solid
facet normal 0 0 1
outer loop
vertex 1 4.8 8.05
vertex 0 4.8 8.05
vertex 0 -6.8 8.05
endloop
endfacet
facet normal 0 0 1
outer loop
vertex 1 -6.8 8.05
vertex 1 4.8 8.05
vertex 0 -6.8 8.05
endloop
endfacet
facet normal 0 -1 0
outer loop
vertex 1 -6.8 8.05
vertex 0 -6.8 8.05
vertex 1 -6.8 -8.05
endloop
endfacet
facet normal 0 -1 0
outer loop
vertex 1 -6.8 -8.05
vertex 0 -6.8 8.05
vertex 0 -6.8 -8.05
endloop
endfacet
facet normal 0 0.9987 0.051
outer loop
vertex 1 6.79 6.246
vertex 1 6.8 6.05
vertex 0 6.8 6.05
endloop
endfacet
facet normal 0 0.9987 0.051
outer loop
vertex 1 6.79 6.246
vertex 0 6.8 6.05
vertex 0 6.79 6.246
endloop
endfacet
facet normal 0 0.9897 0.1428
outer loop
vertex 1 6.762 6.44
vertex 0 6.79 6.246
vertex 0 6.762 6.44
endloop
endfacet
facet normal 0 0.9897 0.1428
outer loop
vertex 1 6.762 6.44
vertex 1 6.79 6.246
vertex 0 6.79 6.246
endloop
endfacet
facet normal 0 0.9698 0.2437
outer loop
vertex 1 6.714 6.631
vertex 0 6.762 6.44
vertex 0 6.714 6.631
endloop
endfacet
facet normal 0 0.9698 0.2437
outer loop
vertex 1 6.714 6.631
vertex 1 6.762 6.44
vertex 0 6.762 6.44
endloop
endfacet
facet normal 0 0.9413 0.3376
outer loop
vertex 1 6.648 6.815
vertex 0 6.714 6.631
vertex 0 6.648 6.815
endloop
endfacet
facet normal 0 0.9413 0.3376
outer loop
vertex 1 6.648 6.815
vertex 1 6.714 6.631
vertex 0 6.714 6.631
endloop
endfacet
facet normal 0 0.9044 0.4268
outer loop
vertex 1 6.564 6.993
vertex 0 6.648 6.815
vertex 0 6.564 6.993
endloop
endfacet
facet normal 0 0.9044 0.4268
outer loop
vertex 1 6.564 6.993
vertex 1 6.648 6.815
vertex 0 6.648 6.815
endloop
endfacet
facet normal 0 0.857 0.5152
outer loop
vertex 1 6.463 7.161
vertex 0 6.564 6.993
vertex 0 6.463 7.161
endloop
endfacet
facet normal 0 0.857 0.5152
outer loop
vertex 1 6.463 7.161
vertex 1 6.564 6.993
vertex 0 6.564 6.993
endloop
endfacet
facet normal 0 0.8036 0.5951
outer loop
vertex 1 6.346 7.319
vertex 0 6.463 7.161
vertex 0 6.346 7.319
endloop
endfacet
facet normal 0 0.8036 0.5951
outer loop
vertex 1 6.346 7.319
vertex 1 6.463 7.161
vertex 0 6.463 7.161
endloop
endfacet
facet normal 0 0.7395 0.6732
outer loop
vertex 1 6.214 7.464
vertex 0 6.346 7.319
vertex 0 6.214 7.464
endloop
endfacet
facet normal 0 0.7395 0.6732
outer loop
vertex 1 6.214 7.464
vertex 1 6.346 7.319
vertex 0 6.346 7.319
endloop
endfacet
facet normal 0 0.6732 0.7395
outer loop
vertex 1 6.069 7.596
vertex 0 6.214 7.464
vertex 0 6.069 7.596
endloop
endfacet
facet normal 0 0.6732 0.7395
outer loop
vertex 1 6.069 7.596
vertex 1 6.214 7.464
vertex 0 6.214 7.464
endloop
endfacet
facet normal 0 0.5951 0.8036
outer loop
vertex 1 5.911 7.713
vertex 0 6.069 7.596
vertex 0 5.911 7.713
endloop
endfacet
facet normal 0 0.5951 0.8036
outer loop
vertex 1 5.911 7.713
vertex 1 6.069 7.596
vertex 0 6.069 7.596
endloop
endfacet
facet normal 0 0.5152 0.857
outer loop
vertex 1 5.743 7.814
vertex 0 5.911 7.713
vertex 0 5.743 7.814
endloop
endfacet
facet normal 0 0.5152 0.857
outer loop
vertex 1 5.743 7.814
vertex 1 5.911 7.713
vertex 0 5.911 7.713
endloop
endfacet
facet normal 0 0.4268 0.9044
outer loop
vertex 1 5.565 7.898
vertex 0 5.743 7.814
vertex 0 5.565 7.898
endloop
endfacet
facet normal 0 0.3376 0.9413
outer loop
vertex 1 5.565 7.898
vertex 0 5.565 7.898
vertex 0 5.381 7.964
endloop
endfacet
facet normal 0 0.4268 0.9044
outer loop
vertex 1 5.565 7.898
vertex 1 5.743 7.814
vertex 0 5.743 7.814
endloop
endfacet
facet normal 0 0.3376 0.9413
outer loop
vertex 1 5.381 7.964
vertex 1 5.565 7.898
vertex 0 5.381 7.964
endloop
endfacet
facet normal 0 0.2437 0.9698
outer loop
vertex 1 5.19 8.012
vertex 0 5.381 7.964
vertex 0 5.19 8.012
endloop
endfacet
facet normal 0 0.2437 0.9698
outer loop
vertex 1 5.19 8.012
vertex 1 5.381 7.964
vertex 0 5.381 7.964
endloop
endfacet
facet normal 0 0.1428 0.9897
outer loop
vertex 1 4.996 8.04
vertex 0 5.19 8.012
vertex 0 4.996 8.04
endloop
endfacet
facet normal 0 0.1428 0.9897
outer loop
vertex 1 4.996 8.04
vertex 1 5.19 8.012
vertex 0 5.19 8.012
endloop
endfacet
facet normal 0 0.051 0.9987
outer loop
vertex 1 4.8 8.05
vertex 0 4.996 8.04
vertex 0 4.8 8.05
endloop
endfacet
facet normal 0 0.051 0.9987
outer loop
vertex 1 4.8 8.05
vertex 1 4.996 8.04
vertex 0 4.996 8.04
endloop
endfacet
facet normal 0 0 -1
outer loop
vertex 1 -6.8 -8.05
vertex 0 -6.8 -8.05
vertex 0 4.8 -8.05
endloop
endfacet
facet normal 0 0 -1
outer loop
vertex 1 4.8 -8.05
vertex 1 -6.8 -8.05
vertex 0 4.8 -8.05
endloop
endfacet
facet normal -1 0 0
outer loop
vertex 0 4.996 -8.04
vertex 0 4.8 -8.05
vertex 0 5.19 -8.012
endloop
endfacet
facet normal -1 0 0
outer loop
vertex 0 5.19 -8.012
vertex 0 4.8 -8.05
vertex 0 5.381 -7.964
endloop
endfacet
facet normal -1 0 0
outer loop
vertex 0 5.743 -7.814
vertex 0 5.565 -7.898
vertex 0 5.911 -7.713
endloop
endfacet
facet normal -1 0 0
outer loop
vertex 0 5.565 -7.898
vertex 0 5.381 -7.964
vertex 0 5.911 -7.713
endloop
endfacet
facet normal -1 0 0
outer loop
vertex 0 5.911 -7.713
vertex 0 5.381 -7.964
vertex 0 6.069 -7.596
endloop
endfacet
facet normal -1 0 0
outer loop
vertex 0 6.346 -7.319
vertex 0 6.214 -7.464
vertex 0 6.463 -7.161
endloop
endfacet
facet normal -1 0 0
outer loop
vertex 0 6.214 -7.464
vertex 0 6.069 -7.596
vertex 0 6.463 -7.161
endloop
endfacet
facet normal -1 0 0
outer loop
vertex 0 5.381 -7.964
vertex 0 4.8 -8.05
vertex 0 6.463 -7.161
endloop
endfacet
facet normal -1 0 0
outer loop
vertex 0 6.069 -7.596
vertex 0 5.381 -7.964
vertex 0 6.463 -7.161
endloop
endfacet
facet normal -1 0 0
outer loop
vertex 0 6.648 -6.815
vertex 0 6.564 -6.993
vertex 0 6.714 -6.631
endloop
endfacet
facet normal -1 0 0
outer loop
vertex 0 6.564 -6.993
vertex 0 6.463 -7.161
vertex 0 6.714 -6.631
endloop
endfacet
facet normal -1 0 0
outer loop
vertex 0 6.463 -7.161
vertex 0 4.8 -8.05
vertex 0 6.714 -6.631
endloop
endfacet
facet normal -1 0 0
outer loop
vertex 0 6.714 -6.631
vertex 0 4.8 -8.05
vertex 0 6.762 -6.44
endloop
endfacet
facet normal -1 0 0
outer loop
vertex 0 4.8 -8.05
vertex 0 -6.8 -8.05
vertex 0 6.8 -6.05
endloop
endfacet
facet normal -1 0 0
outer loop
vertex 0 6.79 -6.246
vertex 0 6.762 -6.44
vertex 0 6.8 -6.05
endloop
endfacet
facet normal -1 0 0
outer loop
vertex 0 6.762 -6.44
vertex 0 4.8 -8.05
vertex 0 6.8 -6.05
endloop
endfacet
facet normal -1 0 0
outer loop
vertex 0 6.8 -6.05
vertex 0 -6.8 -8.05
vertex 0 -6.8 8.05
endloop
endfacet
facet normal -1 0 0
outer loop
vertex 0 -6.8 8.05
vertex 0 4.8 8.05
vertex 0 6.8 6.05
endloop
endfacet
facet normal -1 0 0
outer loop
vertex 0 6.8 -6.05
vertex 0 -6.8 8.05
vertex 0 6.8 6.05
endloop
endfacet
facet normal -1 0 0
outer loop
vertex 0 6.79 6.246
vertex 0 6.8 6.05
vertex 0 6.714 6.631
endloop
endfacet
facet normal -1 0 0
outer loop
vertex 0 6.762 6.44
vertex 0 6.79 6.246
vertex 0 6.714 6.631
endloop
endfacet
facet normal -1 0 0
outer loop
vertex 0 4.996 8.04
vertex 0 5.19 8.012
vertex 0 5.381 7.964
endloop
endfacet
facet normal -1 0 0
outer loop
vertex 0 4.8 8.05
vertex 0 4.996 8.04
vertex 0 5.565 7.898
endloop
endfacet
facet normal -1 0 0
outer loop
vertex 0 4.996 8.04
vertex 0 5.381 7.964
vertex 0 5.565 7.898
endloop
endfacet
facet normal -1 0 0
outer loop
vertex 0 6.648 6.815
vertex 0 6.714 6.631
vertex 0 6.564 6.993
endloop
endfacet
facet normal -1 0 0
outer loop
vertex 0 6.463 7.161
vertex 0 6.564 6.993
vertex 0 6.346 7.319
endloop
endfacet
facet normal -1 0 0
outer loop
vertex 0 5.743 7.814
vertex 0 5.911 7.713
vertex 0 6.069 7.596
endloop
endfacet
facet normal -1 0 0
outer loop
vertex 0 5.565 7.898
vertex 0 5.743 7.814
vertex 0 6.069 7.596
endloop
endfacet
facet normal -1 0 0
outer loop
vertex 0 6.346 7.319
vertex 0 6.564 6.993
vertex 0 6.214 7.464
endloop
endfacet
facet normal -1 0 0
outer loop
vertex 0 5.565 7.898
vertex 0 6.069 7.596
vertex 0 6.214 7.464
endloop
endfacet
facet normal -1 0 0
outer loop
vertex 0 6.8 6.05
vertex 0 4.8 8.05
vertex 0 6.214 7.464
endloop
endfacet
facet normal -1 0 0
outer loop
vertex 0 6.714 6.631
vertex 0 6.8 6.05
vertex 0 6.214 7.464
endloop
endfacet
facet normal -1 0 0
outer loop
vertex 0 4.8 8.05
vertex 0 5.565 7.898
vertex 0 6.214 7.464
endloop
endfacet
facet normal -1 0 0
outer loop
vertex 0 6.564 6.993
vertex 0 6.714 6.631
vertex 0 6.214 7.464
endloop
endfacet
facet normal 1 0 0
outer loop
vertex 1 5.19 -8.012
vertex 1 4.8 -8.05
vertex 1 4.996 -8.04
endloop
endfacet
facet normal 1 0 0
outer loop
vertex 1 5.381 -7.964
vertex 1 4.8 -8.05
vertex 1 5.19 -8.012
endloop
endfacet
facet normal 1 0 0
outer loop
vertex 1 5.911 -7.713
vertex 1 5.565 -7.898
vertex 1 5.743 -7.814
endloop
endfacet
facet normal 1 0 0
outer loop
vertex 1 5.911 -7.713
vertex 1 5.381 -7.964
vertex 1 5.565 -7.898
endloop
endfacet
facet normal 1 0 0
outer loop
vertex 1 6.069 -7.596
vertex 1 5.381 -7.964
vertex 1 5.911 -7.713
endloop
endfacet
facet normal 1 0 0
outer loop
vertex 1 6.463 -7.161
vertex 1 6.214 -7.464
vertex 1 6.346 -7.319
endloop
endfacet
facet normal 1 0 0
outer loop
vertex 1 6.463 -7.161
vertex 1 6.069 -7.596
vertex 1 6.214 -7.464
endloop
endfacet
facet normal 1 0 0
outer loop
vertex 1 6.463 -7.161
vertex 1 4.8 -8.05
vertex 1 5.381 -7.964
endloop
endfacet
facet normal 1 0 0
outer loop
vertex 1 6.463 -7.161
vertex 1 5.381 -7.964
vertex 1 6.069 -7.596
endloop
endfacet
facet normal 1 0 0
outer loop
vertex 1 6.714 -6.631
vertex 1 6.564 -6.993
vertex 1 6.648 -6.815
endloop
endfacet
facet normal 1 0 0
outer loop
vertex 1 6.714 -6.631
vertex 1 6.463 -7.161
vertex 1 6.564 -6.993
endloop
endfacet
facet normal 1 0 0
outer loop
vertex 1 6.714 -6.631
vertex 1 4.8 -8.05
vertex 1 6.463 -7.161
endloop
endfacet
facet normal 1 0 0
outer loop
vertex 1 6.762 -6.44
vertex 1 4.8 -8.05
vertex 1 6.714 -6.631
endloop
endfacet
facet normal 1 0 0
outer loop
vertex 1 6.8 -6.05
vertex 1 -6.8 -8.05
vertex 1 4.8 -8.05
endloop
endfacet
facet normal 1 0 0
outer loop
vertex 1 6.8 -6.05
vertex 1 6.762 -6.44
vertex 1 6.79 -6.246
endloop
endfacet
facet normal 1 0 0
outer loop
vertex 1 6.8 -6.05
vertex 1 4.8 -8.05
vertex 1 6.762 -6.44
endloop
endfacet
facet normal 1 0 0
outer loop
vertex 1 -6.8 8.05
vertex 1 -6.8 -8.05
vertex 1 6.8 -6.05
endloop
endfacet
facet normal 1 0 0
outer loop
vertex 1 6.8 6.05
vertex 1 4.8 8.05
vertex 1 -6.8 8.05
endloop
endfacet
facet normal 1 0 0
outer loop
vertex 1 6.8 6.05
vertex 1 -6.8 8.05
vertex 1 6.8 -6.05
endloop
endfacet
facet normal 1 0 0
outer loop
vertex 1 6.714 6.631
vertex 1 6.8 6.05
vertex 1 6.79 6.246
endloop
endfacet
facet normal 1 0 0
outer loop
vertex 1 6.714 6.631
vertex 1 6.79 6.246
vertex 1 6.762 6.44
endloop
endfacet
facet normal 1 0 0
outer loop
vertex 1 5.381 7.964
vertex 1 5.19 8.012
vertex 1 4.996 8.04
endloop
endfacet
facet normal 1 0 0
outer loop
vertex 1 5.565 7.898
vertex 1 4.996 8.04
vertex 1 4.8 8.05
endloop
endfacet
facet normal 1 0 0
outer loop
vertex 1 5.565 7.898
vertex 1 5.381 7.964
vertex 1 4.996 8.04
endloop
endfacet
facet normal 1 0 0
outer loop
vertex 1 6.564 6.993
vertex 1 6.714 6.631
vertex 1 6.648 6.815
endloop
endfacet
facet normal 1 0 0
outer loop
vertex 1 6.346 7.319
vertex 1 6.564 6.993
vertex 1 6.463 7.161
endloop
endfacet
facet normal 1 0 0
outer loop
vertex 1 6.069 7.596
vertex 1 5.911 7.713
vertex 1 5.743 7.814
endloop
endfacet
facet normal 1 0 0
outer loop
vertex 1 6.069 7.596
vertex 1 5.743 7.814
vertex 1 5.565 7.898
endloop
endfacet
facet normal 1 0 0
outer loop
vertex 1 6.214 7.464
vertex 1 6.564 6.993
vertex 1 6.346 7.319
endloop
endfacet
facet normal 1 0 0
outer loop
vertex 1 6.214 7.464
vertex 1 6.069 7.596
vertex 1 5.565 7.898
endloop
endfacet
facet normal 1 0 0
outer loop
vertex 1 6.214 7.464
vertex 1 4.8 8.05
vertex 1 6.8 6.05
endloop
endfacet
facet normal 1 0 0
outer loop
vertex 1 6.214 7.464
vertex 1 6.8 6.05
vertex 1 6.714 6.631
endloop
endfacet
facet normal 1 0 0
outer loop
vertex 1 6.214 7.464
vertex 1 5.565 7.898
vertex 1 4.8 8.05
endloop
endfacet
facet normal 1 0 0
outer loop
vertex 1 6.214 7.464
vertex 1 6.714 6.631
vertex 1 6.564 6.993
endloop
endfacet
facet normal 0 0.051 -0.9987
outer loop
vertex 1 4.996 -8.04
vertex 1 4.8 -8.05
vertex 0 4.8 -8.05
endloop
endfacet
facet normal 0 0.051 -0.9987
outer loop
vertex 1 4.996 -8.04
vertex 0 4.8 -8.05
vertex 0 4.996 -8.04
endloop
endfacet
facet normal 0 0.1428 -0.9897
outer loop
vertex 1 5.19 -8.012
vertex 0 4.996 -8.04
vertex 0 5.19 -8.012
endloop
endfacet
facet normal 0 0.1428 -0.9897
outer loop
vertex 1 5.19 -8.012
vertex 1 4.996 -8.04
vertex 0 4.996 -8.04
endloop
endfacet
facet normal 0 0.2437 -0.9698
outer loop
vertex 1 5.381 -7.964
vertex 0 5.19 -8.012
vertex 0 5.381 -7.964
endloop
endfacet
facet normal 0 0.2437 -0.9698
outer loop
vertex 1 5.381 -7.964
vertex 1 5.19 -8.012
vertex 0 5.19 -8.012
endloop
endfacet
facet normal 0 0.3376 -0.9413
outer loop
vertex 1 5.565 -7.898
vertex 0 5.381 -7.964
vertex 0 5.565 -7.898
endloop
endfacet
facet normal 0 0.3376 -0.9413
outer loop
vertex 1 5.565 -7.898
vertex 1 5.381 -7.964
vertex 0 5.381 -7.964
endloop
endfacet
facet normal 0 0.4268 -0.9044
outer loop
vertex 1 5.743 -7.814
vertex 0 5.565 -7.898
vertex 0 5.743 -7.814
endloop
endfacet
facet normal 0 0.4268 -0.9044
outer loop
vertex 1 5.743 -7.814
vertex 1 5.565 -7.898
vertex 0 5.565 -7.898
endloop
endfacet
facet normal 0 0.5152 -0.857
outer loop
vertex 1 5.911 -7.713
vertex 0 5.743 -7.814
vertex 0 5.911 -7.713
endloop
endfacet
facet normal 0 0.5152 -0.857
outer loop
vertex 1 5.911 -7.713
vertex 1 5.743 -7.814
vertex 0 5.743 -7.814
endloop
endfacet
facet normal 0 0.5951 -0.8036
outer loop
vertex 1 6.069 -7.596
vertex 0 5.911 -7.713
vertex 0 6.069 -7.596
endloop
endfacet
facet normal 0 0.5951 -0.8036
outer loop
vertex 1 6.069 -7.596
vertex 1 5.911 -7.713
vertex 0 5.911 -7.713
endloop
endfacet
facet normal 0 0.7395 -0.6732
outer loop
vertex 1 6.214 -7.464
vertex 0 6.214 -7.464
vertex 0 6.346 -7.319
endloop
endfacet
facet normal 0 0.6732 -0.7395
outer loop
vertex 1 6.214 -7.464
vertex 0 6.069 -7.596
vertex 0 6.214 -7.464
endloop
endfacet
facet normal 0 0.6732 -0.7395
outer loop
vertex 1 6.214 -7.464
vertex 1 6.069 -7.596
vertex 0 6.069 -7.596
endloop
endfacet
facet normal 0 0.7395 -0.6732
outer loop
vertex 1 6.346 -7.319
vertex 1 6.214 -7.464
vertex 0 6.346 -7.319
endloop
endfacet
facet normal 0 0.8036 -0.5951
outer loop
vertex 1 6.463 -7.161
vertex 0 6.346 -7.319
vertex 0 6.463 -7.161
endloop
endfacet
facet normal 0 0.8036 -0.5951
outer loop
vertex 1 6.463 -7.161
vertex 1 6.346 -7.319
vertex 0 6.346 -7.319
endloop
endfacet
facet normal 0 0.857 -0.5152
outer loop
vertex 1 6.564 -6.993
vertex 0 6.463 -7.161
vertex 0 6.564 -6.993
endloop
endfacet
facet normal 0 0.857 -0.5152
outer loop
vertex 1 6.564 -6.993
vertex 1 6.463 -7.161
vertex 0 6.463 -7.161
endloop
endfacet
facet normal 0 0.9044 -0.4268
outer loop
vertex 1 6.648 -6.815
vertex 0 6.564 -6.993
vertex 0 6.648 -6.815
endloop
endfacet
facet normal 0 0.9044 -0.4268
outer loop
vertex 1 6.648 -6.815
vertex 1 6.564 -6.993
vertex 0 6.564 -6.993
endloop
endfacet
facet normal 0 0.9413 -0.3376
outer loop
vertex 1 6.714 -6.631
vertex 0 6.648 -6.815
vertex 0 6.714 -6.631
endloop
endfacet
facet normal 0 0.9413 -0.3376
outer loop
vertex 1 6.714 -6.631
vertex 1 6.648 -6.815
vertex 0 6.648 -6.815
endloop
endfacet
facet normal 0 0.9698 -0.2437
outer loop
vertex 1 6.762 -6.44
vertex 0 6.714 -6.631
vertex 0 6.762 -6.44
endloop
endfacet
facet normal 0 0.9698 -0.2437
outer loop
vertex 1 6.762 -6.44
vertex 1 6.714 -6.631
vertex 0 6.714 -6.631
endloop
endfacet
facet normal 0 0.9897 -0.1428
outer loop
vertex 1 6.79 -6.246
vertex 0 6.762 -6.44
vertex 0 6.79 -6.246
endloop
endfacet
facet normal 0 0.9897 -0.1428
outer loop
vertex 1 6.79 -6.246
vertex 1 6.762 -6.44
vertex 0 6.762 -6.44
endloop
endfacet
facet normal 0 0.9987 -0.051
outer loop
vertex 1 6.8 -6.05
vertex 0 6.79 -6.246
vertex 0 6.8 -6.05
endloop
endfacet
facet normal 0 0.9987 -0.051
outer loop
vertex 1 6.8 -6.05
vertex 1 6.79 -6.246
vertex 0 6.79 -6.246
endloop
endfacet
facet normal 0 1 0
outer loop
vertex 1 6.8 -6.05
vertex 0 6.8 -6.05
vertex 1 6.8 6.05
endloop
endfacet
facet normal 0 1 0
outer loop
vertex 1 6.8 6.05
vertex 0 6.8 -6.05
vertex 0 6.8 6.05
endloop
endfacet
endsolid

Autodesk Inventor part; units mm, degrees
ref_plane "YZ Plane" through (0, 0, 0) normal (1, 0, 0) x (0, 1, 0)
ref_plane "XZ Plane" through (0, 0, 0) normal (0, 1, 0) x (-1, 0, 0)
ref_plane "XY Plane" through (0, 0, 0) normal (0, 0, 1) x (1, 0, 0)
sketch "Sketch1" plane through (0, 0, 0) normal (1, 0, 0) x (0, 1, 0)
  line L0 (6.8, 8.05) -> (-6.8, 8.05)
  line L1 (-6.8, 8.05) -> (-6.8, -8.05)
  line L2 (-6.8, -8.05) -> (6.8, -8.05)
  line L3 (6.8, -8.05) -> (6.8, 8.05)
  point P0 (0, 0)
  dimension "d0" = 16.1
  dimension "d1" = 13.6
  dimension "d2" = 6.8
  dimension "d3" = 8.05
extrude "Extrusion1" add sketch "Sketch1" along normal blind 1
fillet "Fillet1" radius 2 2 edges at (0.5, 6.8, 8.05) (0.5, 6.8, -8.05)
equation "\"d2\" = 0.5 * d1"
equation "\"d3\" = 0.5 * d0"
properties part number "fingertip lid 4"
